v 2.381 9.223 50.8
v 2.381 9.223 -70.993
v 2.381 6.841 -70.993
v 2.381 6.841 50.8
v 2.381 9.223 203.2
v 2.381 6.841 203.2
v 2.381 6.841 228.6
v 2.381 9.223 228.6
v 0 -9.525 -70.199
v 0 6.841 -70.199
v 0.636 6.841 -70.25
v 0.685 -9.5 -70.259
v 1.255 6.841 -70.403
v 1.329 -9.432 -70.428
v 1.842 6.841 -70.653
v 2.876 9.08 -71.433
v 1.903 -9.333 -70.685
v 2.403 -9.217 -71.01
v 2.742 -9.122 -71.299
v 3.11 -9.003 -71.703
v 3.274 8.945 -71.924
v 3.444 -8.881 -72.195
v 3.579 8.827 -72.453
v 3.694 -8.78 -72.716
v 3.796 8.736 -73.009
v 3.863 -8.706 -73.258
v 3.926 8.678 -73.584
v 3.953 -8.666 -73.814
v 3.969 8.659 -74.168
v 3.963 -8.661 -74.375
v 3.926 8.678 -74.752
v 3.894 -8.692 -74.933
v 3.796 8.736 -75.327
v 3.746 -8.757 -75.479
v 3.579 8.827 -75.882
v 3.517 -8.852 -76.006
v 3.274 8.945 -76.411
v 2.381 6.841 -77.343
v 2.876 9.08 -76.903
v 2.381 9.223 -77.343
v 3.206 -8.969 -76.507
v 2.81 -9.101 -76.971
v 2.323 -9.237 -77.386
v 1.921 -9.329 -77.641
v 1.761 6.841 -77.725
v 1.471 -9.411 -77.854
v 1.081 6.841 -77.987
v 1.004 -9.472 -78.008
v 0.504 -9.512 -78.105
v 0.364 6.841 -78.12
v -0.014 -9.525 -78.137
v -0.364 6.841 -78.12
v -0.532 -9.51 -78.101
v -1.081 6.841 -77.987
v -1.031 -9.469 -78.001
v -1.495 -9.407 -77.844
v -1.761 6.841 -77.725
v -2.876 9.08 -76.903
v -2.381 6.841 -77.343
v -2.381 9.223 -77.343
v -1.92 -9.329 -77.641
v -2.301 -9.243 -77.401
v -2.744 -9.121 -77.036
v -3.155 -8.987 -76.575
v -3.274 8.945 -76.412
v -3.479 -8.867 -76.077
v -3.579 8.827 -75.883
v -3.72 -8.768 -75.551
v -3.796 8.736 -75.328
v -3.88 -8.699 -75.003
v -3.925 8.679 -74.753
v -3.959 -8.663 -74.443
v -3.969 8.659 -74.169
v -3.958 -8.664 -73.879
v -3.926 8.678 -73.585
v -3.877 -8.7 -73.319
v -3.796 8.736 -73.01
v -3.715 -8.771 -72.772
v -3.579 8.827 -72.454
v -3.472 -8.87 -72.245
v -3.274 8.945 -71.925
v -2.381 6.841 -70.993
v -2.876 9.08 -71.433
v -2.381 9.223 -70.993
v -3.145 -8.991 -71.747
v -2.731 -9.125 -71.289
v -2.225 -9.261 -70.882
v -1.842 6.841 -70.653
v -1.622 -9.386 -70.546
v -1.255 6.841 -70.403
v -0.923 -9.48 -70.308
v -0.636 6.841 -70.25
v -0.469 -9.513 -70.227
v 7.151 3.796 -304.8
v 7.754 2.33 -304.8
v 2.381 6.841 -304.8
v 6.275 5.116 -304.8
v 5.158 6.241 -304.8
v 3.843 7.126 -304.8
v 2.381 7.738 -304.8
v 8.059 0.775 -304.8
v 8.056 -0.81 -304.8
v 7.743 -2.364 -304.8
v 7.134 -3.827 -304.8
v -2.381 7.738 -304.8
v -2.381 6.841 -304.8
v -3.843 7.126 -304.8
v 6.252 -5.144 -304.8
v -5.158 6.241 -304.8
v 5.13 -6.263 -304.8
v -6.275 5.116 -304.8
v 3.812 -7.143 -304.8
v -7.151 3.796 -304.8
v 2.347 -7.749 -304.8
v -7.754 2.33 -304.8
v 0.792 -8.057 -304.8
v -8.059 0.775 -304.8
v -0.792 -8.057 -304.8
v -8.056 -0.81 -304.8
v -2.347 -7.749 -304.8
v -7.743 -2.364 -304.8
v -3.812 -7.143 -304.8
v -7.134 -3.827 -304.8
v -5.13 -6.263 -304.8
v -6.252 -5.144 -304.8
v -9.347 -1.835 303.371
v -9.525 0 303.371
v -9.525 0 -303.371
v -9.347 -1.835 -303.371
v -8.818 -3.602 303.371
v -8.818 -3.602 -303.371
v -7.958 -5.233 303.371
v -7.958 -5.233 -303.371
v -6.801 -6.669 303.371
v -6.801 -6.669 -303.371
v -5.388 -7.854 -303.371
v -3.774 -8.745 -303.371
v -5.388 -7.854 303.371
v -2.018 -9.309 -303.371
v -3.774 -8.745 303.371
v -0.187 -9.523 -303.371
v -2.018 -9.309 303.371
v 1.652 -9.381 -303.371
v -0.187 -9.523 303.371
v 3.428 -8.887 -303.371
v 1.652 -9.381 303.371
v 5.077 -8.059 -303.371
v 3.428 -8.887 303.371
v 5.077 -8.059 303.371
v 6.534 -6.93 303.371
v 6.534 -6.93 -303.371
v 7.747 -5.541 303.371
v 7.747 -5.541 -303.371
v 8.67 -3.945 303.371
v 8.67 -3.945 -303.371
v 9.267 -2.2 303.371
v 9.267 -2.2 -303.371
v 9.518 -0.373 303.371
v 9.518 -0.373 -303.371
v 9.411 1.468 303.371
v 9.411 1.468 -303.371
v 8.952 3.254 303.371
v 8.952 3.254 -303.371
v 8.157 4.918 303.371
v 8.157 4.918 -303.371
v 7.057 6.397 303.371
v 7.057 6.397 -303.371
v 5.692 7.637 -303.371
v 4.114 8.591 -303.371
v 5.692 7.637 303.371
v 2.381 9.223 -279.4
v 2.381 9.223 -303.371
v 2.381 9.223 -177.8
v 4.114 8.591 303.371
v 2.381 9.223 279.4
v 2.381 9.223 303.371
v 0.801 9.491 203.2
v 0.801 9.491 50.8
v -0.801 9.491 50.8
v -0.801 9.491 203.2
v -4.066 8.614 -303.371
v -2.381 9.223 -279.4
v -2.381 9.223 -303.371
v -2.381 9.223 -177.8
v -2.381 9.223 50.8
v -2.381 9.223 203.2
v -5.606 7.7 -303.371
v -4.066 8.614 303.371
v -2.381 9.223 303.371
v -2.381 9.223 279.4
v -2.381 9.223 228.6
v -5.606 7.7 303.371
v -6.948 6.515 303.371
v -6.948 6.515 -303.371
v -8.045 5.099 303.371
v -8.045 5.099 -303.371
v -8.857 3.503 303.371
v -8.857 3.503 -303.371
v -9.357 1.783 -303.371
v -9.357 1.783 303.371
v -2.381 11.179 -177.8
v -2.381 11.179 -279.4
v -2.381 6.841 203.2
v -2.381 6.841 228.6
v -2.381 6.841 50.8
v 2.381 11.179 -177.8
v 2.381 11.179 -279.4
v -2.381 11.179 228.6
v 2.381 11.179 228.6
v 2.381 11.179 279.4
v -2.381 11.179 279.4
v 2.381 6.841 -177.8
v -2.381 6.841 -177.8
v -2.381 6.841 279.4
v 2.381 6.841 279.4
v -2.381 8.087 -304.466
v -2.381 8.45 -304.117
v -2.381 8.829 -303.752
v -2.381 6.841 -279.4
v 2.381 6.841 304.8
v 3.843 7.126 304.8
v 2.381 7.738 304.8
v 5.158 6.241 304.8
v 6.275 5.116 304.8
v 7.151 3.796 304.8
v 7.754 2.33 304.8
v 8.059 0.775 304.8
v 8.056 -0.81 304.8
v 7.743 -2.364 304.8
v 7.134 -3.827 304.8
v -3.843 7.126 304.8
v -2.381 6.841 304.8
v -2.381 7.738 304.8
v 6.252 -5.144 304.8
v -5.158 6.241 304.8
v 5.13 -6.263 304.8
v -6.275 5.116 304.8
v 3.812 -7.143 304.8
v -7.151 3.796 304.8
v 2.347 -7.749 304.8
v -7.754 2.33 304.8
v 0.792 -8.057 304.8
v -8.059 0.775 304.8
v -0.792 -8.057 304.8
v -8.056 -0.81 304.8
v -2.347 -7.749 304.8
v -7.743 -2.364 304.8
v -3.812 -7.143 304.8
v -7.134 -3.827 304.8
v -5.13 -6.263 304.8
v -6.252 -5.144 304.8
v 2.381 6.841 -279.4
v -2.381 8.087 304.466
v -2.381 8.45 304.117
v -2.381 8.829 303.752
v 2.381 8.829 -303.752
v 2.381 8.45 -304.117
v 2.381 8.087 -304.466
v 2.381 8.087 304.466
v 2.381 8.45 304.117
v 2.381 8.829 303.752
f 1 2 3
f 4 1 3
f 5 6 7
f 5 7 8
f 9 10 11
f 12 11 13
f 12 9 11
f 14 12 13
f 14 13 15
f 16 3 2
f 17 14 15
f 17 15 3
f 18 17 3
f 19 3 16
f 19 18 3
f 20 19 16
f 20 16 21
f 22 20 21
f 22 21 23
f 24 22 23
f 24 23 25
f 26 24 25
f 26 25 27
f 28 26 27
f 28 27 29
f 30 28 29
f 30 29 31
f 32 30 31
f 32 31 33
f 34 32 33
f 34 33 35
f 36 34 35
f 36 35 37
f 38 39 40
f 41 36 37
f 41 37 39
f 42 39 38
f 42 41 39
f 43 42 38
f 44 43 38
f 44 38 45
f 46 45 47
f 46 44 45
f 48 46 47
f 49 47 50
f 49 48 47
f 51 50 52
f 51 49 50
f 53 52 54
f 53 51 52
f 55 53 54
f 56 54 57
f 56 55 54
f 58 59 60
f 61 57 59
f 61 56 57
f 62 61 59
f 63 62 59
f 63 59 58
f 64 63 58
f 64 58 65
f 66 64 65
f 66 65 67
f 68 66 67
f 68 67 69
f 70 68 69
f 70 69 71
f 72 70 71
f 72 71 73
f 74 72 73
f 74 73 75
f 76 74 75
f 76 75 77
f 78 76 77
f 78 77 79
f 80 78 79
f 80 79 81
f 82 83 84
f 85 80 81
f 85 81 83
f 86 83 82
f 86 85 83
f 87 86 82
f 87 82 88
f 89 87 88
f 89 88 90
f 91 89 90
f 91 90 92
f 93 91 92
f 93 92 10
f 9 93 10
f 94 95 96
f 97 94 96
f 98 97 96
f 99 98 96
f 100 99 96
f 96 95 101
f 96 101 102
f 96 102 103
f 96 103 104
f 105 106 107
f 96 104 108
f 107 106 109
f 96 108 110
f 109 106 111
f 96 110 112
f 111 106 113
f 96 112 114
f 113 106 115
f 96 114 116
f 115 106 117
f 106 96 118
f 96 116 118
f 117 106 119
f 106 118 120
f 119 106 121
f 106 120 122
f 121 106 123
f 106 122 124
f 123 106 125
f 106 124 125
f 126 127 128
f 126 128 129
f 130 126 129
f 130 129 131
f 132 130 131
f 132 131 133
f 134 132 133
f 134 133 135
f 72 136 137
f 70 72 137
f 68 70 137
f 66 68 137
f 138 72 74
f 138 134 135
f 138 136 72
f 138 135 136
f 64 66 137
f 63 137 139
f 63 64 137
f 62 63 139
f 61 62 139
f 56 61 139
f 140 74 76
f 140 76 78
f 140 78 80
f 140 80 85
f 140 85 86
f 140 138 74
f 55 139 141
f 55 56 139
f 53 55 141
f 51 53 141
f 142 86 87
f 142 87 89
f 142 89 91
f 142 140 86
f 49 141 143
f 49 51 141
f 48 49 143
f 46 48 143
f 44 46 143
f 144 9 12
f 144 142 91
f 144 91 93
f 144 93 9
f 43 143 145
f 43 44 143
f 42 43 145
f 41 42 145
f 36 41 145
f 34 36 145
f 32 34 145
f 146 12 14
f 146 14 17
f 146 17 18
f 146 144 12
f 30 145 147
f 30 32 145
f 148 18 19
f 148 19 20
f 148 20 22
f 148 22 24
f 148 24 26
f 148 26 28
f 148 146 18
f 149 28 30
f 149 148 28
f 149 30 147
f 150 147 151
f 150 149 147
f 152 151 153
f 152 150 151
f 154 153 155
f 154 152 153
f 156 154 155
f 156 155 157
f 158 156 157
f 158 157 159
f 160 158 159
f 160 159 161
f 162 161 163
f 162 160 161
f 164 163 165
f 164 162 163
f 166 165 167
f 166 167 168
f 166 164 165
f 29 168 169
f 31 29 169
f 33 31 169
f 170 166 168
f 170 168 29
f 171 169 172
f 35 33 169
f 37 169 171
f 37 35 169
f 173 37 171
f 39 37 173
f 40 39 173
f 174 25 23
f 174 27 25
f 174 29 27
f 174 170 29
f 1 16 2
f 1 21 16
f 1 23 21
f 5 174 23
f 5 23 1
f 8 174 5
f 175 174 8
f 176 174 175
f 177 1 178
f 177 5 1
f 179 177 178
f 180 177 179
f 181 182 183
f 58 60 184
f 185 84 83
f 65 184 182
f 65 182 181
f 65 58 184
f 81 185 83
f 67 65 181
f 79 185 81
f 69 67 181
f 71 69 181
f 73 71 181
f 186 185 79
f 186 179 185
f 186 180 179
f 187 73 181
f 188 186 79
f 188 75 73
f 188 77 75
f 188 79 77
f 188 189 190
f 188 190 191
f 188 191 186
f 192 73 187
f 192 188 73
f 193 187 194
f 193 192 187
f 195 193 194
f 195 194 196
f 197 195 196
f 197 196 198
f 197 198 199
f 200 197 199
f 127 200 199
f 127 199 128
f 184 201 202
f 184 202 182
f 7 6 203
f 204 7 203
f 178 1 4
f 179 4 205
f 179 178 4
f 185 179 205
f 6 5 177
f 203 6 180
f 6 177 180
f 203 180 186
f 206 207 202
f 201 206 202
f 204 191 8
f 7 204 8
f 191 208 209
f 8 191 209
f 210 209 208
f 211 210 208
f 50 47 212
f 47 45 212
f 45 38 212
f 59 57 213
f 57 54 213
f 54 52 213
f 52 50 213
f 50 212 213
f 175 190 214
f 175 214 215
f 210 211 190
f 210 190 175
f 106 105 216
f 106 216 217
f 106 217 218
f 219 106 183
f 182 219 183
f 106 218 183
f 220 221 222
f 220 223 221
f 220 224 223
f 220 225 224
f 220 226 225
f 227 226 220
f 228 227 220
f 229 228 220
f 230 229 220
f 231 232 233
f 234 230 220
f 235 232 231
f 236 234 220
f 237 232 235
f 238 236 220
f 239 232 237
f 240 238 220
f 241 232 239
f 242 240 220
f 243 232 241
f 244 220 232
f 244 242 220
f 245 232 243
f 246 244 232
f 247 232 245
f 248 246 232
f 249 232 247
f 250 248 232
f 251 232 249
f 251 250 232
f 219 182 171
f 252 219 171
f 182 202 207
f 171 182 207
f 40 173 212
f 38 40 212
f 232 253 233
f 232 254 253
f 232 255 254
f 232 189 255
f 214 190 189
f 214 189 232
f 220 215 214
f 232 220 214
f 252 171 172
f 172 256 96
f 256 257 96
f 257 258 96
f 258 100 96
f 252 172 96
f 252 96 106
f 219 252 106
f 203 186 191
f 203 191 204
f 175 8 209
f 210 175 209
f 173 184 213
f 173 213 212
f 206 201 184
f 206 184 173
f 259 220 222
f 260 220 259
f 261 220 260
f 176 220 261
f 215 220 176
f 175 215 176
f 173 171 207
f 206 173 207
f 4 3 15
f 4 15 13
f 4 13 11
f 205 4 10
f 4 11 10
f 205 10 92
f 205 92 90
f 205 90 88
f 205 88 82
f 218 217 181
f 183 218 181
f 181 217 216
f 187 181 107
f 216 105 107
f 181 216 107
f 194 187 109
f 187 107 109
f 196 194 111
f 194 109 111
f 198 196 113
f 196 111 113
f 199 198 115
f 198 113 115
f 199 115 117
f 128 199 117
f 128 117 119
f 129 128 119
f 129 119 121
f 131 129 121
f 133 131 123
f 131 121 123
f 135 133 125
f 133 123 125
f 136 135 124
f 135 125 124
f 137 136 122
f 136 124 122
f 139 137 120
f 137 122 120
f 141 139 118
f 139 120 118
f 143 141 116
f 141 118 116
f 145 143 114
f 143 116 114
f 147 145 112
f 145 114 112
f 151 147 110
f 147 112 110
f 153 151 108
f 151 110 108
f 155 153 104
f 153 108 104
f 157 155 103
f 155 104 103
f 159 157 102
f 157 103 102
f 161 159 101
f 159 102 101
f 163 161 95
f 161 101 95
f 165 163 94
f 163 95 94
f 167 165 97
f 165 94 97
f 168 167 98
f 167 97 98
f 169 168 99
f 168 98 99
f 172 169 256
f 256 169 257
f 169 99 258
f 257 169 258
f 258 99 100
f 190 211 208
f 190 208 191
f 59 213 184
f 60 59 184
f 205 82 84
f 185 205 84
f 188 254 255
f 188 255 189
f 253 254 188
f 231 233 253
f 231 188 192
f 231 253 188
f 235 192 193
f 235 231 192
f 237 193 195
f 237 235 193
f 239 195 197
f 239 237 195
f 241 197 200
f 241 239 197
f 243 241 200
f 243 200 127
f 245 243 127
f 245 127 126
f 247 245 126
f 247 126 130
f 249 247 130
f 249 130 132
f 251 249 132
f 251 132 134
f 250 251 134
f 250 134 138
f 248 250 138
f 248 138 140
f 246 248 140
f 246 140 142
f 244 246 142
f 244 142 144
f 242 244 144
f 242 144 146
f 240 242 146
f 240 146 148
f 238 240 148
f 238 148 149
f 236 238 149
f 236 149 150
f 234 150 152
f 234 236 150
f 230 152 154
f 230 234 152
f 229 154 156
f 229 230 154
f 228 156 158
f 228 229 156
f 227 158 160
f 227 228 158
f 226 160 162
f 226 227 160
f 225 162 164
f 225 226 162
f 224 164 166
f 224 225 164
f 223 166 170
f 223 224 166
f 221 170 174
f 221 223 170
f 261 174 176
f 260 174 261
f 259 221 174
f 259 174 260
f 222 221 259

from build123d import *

# Parameters (mm, degrees)
SKETCH3_R               = 9.525
BOSS_EXTRUDE1_DEPTH     = 304.8
CHAMFER1_SIZE           = 1.42875
CUT_EXTRUDE1_START      = -101.6
CUT_EXTRUDE1_DEPTH      = 101.600004
CUT_EXTRUDE2_DEPTH      = 355.6
BOSS_EXTRUDE2_DEPTH     = 50.8
BOSS_EXTRUDE3_DEPTH     = 101.6
CUT_EXTRUDE3_DEPTH      = 306.153633722
CUT_EXTRUDE3_DEPTH_BACK = 306.153633722
SKETCH9_R               = 3.96875


with BuildPart() as part:
    # Sketch3 → Boss-Extrude1 (new, symmetric)
    with BuildSketch(Plane.XY):
        with Locations(Location((0, 0, 0), (0, 0, 180))):
            Circle(SKETCH3_R)
    extrude(amount=BOSS_EXTRUDE1_DEPTH, both=True)

    # Chamfer1
    chamfer1_edges = [part.edges().sort_by_distance(p)[0] for p in [
        (9.525, 0, -304.8),
        (9.525, 0, 304.8),
    ]]
    chamfer(chamfer1_edges, length=CHAMFER1_SIZE)

    # Sketch5 → Cut-Extrude1 (cut)
    with BuildSketch(Plane.XY.offset(304.8).offset(CUT_EXTRUDE1_START)):
        Polygon((-2.38125, 11.179201601), (2.38125, 11.179201601), (2.38125, 9.222541593), (2.38125, 6.841291593), (-2.38125, 6.841291593), (-2.38125, 9.222541593), align=None)
    extrude(amount=CUT_EXTRUDE1_DEPTH, mode=Mode.SUBTRACT)

    # Sketch6 → Cut-Extrude2 (cut)
    with BuildSketch(Plane(origin=(0, 0, -304.8), x_dir=(-1, 0, 0), z_dir=(0, 0, -1))):
        Polygon((2.38125, 11.179201601), (-2.38125, 11.179201601), (-2.38125, 9.222541593), (-2.38125, 6.841291593), (2.38125, 6.841291593), (2.38125, 9.222541593), align=None)
    extrude(amount=-CUT_EXTRUDE2_DEPTH, mode=Mode.SUBTRACT)

    # Sketch7 → Boss-Extrude2 (add)
    with BuildSketch(Plane.XY.offset(279.4)):
        Polygon((-2.38125, 11.179201601), (-2.38125, 9.222541593), (-2.38125, 6.841291593), (2.38125, 6.841291593), (2.38125, 9.222541593), (2.38125, 11.179201601), align=None)
    extrude(amount=-BOSS_EXTRUDE2_DEPTH)

    # Sketch8 → Boss-Extrude3 (add)
    with BuildSketch(Plane.XY.offset(-279.4)):
        Polygon((-2.38125, 11.179201601), (-2.38125, 9.222541593), (-2.38125, 6.841291593), (2.38125, 6.841291593), (2.38125, 9.222541593), (2.38125, 11.179201601), align=None)
    extrude(amount=BOSS_EXTRUDE3_DEPTH)

    # Sketch9 → Cut-Extrude3 (cut, two sides: drawn at the far end of the back side and taken through both)
    with BuildSketch(Plane(origin=(0, 0, 0), x_dir=(1, 0, 0), z_dir=(0, 1, 0)).offset(-CUT_EXTRUDE3_DEPTH_BACK)):
        with Locations(Location((0, 74.168, 0), (0, 0, 270))):
            Circle(SKETCH9_R)
    extrude(amount=CUT_EXTRUDE3_DEPTH + CUT_EXTRUDE3_DEPTH_BACK, mode=Mode.SUBTRACT)


solid = part.part
